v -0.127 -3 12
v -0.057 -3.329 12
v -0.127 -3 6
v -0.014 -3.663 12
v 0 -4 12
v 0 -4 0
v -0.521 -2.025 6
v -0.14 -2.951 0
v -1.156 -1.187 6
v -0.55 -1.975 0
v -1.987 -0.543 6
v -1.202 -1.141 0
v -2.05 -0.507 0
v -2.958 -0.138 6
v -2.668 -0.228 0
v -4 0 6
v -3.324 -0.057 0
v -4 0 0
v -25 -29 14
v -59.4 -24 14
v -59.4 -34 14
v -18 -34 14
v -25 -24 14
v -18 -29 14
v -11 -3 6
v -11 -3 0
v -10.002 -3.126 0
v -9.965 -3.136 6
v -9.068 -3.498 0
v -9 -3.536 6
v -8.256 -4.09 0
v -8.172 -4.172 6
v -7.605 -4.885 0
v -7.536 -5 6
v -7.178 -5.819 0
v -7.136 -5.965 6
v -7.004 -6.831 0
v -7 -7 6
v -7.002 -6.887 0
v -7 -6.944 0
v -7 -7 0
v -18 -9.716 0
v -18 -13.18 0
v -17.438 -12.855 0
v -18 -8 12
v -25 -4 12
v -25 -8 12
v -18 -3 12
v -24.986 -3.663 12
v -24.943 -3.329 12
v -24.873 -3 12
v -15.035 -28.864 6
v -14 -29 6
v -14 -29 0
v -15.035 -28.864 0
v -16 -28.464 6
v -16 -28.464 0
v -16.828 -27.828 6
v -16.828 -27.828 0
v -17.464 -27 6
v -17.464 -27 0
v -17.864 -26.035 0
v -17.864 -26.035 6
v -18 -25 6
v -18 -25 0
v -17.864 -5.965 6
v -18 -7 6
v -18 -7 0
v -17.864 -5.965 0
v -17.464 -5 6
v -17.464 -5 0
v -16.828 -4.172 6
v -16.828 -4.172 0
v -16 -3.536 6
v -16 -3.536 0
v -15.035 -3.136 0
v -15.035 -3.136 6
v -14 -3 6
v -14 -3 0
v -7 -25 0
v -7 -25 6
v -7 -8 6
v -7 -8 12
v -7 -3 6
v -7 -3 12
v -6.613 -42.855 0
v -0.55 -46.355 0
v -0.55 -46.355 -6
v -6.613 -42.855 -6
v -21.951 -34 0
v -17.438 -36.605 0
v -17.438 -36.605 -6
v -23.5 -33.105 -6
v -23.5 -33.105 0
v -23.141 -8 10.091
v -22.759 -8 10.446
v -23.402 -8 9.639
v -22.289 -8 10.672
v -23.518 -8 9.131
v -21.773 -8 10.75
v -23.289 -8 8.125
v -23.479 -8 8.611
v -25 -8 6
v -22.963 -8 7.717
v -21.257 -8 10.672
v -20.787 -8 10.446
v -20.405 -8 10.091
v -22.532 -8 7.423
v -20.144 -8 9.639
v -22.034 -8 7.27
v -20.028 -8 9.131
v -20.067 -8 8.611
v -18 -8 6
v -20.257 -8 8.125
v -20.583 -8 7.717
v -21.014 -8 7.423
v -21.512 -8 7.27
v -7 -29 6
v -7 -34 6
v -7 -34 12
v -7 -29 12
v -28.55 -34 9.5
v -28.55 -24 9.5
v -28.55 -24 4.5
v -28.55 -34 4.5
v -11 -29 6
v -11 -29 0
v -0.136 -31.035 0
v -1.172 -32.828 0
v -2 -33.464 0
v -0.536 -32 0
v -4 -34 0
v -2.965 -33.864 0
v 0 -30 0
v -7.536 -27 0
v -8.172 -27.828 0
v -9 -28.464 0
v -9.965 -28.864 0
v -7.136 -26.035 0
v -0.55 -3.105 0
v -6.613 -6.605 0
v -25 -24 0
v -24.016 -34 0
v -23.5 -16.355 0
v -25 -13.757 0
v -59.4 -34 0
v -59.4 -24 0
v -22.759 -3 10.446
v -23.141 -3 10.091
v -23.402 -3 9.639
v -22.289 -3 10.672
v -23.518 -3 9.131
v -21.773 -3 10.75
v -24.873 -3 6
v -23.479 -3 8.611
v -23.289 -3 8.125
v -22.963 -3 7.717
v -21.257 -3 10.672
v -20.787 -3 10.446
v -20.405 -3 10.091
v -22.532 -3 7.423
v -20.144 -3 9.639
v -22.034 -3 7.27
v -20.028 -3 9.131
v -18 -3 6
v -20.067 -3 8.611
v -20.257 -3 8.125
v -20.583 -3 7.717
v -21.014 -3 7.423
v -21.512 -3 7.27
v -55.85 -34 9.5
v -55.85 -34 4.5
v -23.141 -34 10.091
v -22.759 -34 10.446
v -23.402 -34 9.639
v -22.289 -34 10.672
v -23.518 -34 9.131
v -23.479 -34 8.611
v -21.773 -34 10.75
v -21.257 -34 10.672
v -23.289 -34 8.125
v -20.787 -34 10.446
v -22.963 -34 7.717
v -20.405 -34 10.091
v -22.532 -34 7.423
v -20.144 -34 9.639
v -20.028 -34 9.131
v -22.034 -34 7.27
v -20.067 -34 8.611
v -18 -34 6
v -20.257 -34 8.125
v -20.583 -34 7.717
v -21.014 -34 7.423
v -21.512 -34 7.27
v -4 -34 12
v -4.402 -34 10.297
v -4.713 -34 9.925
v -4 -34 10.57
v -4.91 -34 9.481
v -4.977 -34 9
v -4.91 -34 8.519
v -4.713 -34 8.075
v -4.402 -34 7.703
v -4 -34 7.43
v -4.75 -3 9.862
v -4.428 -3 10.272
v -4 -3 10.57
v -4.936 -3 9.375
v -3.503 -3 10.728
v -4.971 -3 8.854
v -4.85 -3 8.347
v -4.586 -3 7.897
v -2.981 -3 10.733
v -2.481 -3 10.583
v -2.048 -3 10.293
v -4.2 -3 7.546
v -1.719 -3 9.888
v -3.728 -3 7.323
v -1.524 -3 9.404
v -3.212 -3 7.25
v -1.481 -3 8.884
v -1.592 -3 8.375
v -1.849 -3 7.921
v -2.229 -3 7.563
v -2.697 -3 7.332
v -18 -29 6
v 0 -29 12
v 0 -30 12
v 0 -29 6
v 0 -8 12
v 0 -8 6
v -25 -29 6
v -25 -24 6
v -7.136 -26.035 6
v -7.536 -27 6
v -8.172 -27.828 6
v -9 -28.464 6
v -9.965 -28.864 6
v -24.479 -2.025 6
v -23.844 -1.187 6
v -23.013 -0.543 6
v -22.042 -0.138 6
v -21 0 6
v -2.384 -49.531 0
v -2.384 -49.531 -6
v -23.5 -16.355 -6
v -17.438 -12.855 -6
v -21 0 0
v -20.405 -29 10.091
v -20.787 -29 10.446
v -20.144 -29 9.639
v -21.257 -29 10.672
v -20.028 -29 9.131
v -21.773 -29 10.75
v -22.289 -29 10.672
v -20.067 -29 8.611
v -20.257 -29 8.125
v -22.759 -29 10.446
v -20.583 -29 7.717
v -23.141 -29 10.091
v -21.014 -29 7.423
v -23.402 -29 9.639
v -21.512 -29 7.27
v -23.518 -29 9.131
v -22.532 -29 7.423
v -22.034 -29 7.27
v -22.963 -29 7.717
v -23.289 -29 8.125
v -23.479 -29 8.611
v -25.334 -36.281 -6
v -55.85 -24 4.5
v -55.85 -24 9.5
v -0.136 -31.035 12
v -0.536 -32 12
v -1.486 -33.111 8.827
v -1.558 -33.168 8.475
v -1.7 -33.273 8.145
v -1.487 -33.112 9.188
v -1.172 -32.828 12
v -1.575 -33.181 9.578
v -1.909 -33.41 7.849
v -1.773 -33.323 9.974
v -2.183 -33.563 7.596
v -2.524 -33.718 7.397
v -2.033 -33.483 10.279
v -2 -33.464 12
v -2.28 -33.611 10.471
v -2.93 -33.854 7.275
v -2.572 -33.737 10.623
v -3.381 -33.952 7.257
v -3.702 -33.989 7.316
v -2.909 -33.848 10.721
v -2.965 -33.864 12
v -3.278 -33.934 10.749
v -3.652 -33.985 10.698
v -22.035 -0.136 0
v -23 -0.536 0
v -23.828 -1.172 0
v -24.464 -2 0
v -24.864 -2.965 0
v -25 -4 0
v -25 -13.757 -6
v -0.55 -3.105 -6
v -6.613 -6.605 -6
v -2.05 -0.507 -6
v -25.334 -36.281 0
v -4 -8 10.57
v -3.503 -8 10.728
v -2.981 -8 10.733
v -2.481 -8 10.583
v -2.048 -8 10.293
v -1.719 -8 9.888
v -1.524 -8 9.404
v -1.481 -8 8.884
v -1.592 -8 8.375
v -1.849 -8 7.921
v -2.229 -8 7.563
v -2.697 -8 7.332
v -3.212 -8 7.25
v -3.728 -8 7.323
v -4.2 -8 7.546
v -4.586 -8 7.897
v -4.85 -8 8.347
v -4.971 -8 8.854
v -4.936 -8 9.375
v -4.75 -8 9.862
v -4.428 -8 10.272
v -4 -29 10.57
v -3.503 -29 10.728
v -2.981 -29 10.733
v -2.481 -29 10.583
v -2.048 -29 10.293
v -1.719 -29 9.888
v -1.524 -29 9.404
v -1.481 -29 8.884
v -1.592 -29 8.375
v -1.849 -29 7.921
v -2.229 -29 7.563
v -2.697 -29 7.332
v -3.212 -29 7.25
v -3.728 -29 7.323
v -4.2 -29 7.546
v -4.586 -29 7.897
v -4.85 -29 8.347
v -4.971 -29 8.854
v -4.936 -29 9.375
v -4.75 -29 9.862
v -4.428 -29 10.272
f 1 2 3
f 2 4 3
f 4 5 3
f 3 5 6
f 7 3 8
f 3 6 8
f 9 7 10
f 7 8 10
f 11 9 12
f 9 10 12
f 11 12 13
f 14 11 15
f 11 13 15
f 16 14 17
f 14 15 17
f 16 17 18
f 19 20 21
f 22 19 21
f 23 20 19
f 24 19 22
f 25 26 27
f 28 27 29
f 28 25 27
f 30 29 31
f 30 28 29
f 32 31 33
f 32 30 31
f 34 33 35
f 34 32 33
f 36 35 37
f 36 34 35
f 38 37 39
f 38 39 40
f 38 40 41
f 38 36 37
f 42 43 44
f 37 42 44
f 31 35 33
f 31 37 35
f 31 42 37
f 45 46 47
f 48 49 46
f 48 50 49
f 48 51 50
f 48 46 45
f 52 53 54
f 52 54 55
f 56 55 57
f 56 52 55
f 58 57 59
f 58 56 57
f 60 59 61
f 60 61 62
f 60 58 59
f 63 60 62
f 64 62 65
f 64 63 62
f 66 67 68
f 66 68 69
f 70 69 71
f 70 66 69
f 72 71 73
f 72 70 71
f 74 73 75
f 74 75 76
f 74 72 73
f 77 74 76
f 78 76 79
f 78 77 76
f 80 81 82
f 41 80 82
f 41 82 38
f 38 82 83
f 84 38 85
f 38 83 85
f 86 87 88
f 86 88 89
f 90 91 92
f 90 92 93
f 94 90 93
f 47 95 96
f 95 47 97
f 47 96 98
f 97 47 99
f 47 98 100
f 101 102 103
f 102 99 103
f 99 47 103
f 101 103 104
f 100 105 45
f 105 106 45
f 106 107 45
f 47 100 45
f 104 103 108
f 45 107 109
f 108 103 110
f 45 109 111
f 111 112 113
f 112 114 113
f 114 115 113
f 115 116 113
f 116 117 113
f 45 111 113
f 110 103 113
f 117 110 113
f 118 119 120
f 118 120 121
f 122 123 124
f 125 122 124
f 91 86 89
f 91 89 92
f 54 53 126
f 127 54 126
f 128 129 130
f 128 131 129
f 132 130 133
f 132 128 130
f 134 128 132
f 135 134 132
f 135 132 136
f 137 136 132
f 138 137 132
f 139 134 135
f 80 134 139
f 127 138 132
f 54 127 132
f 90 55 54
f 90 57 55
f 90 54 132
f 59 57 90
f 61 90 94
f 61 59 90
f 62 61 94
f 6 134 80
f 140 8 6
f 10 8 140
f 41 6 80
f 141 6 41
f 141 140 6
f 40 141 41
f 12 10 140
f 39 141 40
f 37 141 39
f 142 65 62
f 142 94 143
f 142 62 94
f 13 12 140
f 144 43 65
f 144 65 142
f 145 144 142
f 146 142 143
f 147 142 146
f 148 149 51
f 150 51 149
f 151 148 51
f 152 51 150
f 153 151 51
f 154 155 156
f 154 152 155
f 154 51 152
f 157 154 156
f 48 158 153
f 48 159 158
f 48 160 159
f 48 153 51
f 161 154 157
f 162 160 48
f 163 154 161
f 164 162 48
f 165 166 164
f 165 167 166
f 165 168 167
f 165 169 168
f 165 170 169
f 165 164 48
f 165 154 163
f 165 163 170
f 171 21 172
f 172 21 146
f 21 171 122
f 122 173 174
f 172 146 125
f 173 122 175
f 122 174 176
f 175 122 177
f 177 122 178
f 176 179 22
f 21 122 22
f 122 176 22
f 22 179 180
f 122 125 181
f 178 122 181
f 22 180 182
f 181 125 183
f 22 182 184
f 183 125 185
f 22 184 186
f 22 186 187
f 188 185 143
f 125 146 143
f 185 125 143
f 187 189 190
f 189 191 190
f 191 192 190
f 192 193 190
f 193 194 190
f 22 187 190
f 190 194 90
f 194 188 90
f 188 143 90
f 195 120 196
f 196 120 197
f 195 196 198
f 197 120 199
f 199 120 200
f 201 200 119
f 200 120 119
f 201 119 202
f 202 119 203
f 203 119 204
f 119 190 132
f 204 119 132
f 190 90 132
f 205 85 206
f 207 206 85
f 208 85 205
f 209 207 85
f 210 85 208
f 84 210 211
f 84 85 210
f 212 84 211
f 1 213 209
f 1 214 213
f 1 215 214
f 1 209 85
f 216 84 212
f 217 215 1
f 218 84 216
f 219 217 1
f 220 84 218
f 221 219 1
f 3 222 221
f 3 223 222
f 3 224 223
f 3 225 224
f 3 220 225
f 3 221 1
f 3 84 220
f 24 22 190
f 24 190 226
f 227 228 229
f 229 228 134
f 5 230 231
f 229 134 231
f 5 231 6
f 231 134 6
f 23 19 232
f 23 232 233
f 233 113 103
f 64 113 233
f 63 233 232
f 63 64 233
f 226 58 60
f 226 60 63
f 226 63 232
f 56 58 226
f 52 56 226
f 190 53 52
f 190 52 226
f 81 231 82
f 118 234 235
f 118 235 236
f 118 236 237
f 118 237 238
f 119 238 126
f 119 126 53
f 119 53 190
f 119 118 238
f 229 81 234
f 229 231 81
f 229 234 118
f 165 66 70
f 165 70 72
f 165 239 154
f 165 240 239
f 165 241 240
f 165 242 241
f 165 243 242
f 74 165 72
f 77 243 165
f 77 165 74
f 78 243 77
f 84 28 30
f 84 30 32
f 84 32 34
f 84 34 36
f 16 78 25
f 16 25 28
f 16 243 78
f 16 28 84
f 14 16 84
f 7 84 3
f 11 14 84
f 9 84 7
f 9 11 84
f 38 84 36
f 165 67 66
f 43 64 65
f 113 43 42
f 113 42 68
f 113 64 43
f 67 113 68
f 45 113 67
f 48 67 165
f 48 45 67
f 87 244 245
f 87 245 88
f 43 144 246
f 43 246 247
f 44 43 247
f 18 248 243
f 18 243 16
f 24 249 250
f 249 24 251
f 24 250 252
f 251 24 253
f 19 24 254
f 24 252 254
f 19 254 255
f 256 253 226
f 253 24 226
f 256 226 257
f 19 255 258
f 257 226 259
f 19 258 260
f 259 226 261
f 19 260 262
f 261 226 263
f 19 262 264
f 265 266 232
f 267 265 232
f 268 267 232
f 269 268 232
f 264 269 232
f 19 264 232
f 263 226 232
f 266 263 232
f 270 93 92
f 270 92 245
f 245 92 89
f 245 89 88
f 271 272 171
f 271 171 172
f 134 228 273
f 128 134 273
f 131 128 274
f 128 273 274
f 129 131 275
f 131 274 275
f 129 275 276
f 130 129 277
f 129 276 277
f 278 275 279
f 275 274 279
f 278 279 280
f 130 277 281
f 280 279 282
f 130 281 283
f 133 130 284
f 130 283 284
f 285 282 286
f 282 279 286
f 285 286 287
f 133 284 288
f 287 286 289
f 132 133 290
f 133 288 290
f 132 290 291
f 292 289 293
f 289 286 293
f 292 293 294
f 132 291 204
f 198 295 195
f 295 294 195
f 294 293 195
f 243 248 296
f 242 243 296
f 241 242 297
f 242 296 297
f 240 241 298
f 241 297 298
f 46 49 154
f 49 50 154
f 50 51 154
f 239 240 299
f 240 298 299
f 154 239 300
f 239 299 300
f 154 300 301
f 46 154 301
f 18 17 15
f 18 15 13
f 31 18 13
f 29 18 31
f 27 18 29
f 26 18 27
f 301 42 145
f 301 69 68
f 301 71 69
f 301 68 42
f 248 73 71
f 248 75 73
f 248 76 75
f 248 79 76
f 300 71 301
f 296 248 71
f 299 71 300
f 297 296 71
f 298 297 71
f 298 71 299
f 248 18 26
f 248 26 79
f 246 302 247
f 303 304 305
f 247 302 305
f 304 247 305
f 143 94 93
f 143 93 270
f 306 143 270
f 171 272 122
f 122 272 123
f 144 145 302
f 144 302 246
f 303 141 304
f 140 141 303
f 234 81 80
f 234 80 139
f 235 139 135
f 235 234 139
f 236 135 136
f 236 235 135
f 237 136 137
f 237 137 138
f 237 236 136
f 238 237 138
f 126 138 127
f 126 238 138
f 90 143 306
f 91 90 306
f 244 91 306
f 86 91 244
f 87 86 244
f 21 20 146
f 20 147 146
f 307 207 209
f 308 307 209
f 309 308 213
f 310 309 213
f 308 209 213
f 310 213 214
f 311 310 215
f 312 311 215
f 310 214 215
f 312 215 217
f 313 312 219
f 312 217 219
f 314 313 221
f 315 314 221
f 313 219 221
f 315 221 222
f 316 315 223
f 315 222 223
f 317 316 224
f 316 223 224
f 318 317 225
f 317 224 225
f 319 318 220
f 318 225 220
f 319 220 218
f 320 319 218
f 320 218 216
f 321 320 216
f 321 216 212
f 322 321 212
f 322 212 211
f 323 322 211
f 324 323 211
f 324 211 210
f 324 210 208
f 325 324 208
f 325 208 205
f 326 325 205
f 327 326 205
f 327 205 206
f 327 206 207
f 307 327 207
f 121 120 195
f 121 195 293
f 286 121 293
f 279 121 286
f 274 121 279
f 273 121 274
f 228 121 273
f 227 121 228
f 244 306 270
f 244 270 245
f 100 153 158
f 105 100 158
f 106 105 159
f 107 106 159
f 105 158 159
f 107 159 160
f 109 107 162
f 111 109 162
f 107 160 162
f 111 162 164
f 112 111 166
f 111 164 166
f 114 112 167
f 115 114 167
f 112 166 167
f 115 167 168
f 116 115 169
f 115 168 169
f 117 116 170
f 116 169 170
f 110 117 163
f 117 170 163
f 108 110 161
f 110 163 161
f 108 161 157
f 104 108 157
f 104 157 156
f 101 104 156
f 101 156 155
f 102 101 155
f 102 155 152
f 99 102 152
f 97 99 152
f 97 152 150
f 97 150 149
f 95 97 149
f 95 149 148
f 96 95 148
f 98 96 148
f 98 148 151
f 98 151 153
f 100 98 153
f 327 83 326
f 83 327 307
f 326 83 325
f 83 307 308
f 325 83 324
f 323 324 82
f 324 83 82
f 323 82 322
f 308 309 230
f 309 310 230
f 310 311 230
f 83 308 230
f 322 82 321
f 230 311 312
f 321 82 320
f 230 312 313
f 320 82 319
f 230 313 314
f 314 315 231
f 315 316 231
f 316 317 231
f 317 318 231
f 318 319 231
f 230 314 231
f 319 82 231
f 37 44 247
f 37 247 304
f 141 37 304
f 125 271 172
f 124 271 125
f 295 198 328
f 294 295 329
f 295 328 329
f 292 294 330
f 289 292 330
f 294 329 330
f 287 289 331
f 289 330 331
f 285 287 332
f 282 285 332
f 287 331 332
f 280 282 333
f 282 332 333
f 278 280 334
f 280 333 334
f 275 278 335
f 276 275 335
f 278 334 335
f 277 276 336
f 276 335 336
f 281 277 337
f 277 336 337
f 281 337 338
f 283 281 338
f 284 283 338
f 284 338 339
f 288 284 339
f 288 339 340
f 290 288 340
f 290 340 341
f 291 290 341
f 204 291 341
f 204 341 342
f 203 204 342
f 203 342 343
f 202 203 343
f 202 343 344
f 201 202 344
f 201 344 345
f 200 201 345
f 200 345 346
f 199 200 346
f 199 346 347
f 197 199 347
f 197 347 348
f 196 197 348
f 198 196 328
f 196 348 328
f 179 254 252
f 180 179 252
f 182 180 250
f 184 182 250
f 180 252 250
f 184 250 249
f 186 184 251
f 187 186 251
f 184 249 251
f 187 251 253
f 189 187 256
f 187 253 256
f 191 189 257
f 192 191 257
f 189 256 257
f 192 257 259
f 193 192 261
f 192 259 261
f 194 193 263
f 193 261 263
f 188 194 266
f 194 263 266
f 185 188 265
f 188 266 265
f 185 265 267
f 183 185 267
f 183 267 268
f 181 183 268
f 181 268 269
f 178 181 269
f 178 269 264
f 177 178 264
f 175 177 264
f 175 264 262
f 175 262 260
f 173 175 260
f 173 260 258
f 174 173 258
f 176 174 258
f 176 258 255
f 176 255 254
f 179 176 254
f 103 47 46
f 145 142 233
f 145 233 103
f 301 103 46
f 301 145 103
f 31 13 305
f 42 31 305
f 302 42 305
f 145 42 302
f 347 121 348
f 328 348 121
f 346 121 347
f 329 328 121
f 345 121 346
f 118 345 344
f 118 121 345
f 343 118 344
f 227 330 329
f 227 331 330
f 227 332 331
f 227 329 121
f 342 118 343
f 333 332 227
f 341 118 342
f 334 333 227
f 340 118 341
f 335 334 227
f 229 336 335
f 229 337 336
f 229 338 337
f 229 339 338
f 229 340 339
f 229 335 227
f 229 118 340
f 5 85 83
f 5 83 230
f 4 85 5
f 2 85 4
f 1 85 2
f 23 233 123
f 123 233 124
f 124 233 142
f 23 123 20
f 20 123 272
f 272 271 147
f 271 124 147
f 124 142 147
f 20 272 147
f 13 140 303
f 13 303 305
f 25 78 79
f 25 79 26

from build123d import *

# Parameters (mm, degrees)
CROQUIS1_W              = 25
CROQUIS1_H              = 34
SALIENTE_EXTRUIR1_DEPTH = 6
CROQUIS2_W              = 7
CROQUIS2_H              = 5
SALIENTE_EXTRUIR2_DEPTH = 6
CORTAR_EXTRUIR1_REACH   = 44.626
CROQUIS3_W              = 11
CROQUIS3_H              = 26
REDONDEO1_R             = 4
SALIENTE_EXTRUIR3_DEPTH = 12
SALIENTE_EXTRUIR4_DEPTH = 2
CORTAR_EXTRUIR2_REACH   = 70.45
CROQUIS7_R              = 1.75
CORTAR_EXTRUIR3_REACH   = 67.577
CROQUIS8_W              = 27.3
CROQUIS8_H              = 5
SALIENTE_EXTRUIR5_DEPTH = 6


with BuildPart() as part:
    # Croquis1 → Saliente-Extruir1 (new body)
    with BuildSketch(Plane.XY):
        with Locations((-12.5, -17)):
            Rectangle(CROQUIS1_W, CROQUIS1_H)
    extrude(amount=SALIENTE_EXTRUIR1_DEPTH)

    # Croquis2 → Saliente-Extruir2 (add)
    with BuildSketch(Plane.XY.offset(6)):
        with Locations((-21.5, -5.5)):
            Rectangle(CROQUIS2_W, CROQUIS2_H)
        with Locations((-3.5, -5.5)):
            Rectangle(CROQUIS2_W, CROQUIS2_H)
        with Locations((-3.5, -31.5)):
            Rectangle(CROQUIS2_W, CROQUIS2_H)
        with Locations((-21.5, -31.5)):
            Rectangle(CROQUIS2_W, CROQUIS2_H)
    extrude(amount=SALIENTE_EXTRUIR2_DEPTH)

    # Croquis3 → Cortar-Extruir1 (cut, up to next)
    with BuildSketch(Plane.XY.offset(6), mode=Mode.PRIVATE) as cortar_extruir1_sk1:
        with Locations((-12.5, -16)):
            Rectangle(CROQUIS3_W, CROQUIS3_H)
    cortar_extruir1_tool1 = extrude(cortar_extruir1_sk1.sketch, amount=-CORTAR_EXTRUIR1_REACH, mode=Mode.PRIVATE) & part.part
    add(cortar_extruir1_tool1.solids().sort_by_distance((-12.5, -16, 6))[0], mode=Mode.SUBTRACT)

    # Redondeo1
    # the kernel refuses this fillet: 4 mm, written as the material it adds along each edge
    with BuildSketch(Plane(origin=(-18, -29, 6), x_dir=(0, 1, 0), z_dir=(0, 0, -1)), Plane(origin=(-7, -29, 6), x_dir=(-1, 0, 0), z_dir=(0, 0, -1)), Plane(origin=(-18, -3, 6), x_dir=(1, 0, 0), z_dir=(0, 0, -1))) as redondeo1_piece_1:
        with BuildLine():
            CenterArc((REDONDEO1_R, REDONDEO1_R), REDONDEO1_R, 180, 90)
            Line((0, REDONDEO1_R), (0, 0))
            Line((0, 0), (REDONDEO1_R, 0))
        make_face()
    extrude(amount=6)
    with BuildSketch(Plane(origin=(-7, -3, 6), x_dir=(-1, 0, 0), z_dir=(0, 0, -1))) as redondeo1_piece_2:
        with BuildLine():
            CenterArc((REDONDEO1_R, -REDONDEO1_R), REDONDEO1_R, 90, 90)
            Line((0, -REDONDEO1_R), (0, 0))
            Line((0, 0), (REDONDEO1_R, 0))
        make_face()
    extrude(amount=6)
    # the kernel refuses this fillet: 4 mm, written as the material it takes off along each edge
    with BuildSketch(Plane(origin=(0, 0, -10), x_dir=(-1, 0, 0), z_dir=(0, 0, 1))) as redondeo1_2_piece_1:
        with BuildLine():
            CenterArc((REDONDEO1_R, REDONDEO1_R), REDONDEO1_R, 180, 90)
            Line((0, REDONDEO1_R), (0, 0))
            Line((0, 0), (REDONDEO1_R, 0))
        make_face()
    extrude(amount=26, mode=Mode.SUBTRACT)
    with BuildSketch(Plane(origin=(0, -34, 22), x_dir=(0, 1, 0), z_dir=(0, 0, -1)), Plane(origin=(-25, -34, -10), x_dir=(0, 1, 0), z_dir=(0, 0, 1))) as redondeo1_2_piece_2:
        with BuildLine():
            CenterArc((REDONDEO1_R, -REDONDEO1_R), REDONDEO1_R, 90, 90)
            Line((0, -REDONDEO1_R), (0, 0))
            Line((0, 0), (REDONDEO1_R, 0))
        make_face()
    extrude(amount=32, mode=Mode.SUBTRACT)
    with BuildSketch(Plane(origin=(-25, 0, -10), x_dir=(1, 0, 0), z_dir=(0, 0, 1))) as redondeo1_2_piece_3:
        with BuildLine():
            CenterArc((REDONDEO1_R, -REDONDEO1_R), REDONDEO1_R, 90, 90)
            Line((0, -REDONDEO1_R), (0, 0))
            Line((0, 0), (REDONDEO1_R, 0))
        make_face()
    extrude(amount=26, mode=Mode.SUBTRACT)

    # Croquis5 → Saliente-Extruir3 (add)
    with BuildSketch(Plane(origin=(0, 0, 0), x_dir=(-1, 0, 0), z_dir=(0, 0, -1))):
        with BuildLine():
            Line((25, -29), (25, -30))
            ThreePointArc((25, -30), (23.828427125, -32.828427125), (21, -34))
            Line((21, -34), (25, -34))
            Line((25, -34), (59.4, -34))
            Line((59.4, -34), (59.4, -24))
            Line((59.4, -24), (25, -24))
            Line((25, -24), (25, -29))
        make_face()
    extrude(amount=-SALIENTE_EXTRUIR3_DEPTH)

    # Croquis6 → Saliente-Extruir4 (add)
    with BuildSketch(Plane.XY.offset(12)):
        Polygon((-18, -29), (-25, -29), (-25, -24), (-59.4, -24), (-59.4, -34), (-18, -34), align=None)
    extrude(amount=SALIENTE_EXTRUIR4_DEPTH)

    # Cortar-Extruir2: up to this face of the body (flat: up to its plane)
    cortar_extruir2_end = Plane(part.part.faces().sort_by_distance((-34.409507042, -34, 6.559859155))[0])
    # Croquis7 → Cortar-Extruir2 (cut, up to the picked face)
    with BuildSketch(Plane(origin=(0, -3, 0), x_dir=(1, 0, 0), z_dir=(0, 1, 0)), mode=Mode.PRIVATE) as cortar_extruir2_sk1:
        with Locations(Location((-21.772983346, -9, 0), (0, 0, 270))):
            Circle(CROQUIS7_R)
    cortar_extruir2_tool1 = split(extrude(cortar_extruir2_sk1.sketch, amount=-CORTAR_EXTRUIR2_REACH, mode=Mode.PRIVATE), bisect_by=cortar_extruir2_end, keep=Keep.BOTH, mode=Mode.PRIVATE)
    # Croquis7 → Cortar-Extruir2 (cut, up to the picked face)
    with BuildSketch(Plane(origin=(0, -3, 0), x_dir=(1, 0, 0), z_dir=(0, 1, 0)), mode=Mode.PRIVATE) as cortar_extruir2_sk2:
        with Locations(Location((-3.227016654, -9, 0), (0, 0, 243.787297197))):
            Circle(CROQUIS7_R)
    cortar_extruir2_tool2 = split(extrude(cortar_extruir2_sk2.sketch, amount=-CORTAR_EXTRUIR2_REACH, mode=Mode.PRIVATE), bisect_by=cortar_extruir2_end, keep=Keep.BOTH, mode=Mode.PRIVATE)
    add(cortar_extruir2_tool1.solids().sort_by(Axis((-21.772983, -3, 9), (0, -1, 0)))[0], mode=Mode.SUBTRACT)
    add(cortar_extruir2_tool2.solids().sort_by(Axis((-3.227017, -3, 9), (0, -1, 0)))[0], mode=Mode.SUBTRACT)

    # Croquis8 → Cortar-Extruir3 (cut, up to next)
    with BuildSketch(Plane(origin=(0, -24, 0), x_dir=(1, 0, 0), z_dir=(0, 1, 0)), mode=Mode.PRIVATE) as cortar_extruir3_sk1:
        with Locations((-42.2, -7)):
            Rectangle(CROQUIS8_W, CROQUIS8_H)
    cortar_extruir3_tool1 = extrude(cortar_extruir3_sk1.sketch, amount=-CORTAR_EXTRUIR3_REACH, mode=Mode.PRIVATE) & part.part
    add(cortar_extruir3_tool1.solids().sort_by_distance((-42.2, -24, 7))[0], mode=Mode.SUBTRACT)

    # Croquis9 → Saliente-Extruir5 (add)
    with BuildSketch(Plane(origin=(0, 0, 0), x_dir=(-1, 0, 0), z_dir=(0, 0, -1))):
        Polygon((2.0503268, -0.507325607), (25, -13.757325607), (23.5, -16.355401819), (17.437822174, -12.855401819), (6.612504626, -6.605401819), (0.5503268, -3.105401819), align=None)
        Polygon((25.33358423, -36.281262865), (2.38391103, -49.531262865), (0.5503268, -46.355401819), (6.612504626, -42.855401819), (17.437822174, -36.605401819), (23.5, -33.105401819), align=None)
    extrude(amount=SALIENTE_EXTRUIR5_DEPTH)


solid = part.part
